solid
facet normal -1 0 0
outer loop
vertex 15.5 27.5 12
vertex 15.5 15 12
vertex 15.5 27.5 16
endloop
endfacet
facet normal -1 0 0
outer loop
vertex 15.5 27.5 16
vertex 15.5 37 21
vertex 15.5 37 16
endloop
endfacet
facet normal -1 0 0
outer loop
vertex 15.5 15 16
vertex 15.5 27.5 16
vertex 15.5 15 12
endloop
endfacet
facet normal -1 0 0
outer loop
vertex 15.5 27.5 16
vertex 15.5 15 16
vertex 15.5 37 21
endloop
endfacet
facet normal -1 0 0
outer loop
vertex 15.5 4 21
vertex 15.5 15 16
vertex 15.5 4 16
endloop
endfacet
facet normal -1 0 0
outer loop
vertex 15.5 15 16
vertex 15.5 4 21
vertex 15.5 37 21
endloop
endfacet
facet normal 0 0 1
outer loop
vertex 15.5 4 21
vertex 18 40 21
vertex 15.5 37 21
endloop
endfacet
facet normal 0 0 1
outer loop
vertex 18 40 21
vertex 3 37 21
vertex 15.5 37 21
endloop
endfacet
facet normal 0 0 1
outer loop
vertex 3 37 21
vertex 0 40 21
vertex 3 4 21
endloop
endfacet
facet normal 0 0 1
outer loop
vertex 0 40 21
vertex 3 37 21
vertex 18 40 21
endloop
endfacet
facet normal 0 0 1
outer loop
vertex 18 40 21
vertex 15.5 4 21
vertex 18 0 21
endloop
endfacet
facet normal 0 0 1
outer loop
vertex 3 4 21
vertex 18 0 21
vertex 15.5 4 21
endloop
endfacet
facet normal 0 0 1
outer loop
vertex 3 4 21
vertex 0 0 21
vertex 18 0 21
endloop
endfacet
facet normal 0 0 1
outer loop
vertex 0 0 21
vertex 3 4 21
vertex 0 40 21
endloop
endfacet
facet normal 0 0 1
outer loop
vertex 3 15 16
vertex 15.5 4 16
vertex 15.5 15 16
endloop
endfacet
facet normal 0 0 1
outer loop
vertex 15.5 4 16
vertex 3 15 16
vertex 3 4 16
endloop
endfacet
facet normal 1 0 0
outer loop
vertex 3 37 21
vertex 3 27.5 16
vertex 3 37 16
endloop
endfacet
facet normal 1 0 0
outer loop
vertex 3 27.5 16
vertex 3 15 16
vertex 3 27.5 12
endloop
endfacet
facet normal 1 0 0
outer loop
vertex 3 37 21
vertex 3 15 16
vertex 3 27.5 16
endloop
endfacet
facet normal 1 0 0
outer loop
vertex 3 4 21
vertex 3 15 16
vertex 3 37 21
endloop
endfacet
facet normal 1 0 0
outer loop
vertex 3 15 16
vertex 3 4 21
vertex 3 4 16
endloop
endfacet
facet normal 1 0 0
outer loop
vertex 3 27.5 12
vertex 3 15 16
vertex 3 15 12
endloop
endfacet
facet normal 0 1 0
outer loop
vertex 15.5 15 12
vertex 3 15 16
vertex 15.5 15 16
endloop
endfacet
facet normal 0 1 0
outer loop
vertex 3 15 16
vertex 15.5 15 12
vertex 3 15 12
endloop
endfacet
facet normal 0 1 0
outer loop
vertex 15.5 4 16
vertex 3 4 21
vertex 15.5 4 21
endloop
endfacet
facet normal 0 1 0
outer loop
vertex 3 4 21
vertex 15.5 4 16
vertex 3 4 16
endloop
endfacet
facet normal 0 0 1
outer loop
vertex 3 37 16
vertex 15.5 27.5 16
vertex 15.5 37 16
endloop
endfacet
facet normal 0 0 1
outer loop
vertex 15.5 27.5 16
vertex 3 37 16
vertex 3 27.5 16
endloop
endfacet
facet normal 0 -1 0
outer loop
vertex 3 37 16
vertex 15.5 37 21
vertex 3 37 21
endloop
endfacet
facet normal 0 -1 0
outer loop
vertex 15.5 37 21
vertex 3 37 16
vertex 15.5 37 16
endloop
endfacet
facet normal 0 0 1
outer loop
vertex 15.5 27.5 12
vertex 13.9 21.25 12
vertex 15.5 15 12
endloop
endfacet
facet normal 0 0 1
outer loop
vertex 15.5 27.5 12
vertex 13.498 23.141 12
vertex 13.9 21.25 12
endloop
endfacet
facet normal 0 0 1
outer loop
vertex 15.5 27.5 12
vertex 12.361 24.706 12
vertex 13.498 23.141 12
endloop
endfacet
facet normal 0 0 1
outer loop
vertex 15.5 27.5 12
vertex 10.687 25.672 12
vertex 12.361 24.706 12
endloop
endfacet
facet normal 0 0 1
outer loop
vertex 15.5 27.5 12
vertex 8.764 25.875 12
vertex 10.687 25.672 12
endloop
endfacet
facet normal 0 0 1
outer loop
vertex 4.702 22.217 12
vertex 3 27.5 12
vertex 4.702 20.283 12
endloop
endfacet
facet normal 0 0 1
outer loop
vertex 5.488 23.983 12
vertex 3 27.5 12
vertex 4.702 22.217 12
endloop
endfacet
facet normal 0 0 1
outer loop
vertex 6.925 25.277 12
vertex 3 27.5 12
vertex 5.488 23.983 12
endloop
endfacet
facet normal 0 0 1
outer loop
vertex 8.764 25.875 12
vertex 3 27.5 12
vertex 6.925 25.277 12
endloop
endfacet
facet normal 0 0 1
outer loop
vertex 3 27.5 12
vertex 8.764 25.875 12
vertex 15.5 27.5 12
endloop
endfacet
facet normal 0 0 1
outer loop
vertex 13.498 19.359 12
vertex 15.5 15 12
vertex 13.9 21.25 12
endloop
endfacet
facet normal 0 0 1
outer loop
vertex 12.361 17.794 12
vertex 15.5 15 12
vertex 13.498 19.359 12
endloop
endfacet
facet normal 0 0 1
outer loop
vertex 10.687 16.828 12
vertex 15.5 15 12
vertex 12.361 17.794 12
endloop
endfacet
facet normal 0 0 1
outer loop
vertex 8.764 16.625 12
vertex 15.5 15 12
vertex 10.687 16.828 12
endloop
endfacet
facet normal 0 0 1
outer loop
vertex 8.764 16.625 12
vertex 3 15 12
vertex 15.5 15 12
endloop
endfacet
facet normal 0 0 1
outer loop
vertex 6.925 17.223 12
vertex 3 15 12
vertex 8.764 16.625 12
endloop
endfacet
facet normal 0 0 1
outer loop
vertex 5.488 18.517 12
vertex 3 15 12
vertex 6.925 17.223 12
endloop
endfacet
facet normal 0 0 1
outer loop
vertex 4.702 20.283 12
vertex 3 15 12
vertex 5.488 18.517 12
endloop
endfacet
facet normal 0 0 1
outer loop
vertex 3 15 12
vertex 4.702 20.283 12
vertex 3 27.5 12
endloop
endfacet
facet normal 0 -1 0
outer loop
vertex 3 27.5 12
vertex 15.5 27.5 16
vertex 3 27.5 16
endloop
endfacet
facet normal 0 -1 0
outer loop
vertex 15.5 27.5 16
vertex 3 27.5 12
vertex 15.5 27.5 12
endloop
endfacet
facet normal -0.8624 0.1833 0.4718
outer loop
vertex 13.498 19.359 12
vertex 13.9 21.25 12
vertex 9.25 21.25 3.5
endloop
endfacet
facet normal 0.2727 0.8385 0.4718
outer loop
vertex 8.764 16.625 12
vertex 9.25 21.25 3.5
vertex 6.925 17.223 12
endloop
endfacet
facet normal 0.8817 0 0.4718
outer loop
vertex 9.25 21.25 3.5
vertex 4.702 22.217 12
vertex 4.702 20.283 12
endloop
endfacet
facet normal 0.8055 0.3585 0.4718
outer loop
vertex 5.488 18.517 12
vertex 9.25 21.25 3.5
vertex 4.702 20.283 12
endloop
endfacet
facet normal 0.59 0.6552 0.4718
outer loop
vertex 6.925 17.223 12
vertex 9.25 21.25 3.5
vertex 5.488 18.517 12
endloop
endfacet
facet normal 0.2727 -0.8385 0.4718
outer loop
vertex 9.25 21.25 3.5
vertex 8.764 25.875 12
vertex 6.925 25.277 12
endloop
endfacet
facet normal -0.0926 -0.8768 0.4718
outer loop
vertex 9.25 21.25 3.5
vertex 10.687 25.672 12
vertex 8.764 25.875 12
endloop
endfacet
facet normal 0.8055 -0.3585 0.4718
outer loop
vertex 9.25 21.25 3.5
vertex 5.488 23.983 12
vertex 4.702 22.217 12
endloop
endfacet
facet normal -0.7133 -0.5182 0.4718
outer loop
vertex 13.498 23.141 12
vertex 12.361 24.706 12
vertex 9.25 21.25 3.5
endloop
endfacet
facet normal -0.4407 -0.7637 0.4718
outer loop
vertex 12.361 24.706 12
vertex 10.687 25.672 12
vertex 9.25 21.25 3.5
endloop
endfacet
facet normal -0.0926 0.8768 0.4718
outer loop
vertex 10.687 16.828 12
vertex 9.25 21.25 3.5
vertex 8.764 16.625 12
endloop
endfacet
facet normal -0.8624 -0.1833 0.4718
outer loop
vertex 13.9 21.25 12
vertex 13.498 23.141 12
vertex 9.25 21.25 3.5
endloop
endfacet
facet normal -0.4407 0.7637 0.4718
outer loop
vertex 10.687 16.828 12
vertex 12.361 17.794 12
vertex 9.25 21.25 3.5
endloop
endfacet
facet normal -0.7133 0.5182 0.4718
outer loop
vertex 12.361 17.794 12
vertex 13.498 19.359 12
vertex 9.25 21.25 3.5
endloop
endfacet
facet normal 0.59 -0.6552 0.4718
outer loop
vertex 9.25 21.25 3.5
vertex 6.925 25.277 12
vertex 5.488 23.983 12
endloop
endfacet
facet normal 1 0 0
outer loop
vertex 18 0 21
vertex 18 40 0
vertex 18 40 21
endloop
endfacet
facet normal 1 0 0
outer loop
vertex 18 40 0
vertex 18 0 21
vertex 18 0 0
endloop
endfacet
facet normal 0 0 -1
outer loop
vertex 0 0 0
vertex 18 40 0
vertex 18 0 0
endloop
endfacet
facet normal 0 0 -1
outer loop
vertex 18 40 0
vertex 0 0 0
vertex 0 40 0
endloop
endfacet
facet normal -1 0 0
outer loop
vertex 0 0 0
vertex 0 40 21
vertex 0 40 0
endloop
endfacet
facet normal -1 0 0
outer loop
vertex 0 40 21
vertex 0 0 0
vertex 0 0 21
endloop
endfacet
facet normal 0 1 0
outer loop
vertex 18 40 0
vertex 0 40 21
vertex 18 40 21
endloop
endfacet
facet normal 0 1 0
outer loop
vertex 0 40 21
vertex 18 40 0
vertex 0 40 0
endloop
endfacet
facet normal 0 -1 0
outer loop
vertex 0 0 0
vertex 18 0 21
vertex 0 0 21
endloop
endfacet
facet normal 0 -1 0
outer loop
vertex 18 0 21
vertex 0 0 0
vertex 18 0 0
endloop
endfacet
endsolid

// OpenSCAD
length = 18;
width = 40;
height = 21;

// translate([0,0,7.5])
// 
// 
// radius 8.8
// height 8
// total height 17.5
pyramidHeight = 8 + .5;
pyramidDiameter = 8.8 + .5;

boxLength = 12.5;
boxWidth = 12.5;
boxHeight = 17.5 - pyramidHeight;
fingerNotchSize = 11;
boxRemainder = 4;
spaceBetweenBoxes = 3;
//

 difference(){
    cube([length, width, height]);
     translate([3,15,height - (pyramidHeight + boxHeight)])
        Pyramid();
//     translate([5 + boxLength + spaceBetweenBoxes,15,height - (pyramidHeight + boxHeight)])
//        Pyramid();
 }

module Pyramid()
{
    union()
    {
        translate([0, -fingerNotchSize, pyramidHeight + boxRemainder])
            cube([boxLength, fingerNotchSize, boxHeight - boxRemainder]);
        translate([0, fingerNotchSize, pyramidHeight + boxRemainder])
            cube([boxLength, fingerNotchSize, boxHeight - boxRemainder]);
        translate([0, 0, pyramidHeight])
            cube([boxLength, boxWidth, boxHeight]);
        rotate([180, 0, 0])
            translate([boxLength/2, -boxWidth/2, -pyramidHeight/2])
                cylinder(h=pyramidHeight, r1=pyramidDiameter/2, r2=0, center=true);
    }
}
